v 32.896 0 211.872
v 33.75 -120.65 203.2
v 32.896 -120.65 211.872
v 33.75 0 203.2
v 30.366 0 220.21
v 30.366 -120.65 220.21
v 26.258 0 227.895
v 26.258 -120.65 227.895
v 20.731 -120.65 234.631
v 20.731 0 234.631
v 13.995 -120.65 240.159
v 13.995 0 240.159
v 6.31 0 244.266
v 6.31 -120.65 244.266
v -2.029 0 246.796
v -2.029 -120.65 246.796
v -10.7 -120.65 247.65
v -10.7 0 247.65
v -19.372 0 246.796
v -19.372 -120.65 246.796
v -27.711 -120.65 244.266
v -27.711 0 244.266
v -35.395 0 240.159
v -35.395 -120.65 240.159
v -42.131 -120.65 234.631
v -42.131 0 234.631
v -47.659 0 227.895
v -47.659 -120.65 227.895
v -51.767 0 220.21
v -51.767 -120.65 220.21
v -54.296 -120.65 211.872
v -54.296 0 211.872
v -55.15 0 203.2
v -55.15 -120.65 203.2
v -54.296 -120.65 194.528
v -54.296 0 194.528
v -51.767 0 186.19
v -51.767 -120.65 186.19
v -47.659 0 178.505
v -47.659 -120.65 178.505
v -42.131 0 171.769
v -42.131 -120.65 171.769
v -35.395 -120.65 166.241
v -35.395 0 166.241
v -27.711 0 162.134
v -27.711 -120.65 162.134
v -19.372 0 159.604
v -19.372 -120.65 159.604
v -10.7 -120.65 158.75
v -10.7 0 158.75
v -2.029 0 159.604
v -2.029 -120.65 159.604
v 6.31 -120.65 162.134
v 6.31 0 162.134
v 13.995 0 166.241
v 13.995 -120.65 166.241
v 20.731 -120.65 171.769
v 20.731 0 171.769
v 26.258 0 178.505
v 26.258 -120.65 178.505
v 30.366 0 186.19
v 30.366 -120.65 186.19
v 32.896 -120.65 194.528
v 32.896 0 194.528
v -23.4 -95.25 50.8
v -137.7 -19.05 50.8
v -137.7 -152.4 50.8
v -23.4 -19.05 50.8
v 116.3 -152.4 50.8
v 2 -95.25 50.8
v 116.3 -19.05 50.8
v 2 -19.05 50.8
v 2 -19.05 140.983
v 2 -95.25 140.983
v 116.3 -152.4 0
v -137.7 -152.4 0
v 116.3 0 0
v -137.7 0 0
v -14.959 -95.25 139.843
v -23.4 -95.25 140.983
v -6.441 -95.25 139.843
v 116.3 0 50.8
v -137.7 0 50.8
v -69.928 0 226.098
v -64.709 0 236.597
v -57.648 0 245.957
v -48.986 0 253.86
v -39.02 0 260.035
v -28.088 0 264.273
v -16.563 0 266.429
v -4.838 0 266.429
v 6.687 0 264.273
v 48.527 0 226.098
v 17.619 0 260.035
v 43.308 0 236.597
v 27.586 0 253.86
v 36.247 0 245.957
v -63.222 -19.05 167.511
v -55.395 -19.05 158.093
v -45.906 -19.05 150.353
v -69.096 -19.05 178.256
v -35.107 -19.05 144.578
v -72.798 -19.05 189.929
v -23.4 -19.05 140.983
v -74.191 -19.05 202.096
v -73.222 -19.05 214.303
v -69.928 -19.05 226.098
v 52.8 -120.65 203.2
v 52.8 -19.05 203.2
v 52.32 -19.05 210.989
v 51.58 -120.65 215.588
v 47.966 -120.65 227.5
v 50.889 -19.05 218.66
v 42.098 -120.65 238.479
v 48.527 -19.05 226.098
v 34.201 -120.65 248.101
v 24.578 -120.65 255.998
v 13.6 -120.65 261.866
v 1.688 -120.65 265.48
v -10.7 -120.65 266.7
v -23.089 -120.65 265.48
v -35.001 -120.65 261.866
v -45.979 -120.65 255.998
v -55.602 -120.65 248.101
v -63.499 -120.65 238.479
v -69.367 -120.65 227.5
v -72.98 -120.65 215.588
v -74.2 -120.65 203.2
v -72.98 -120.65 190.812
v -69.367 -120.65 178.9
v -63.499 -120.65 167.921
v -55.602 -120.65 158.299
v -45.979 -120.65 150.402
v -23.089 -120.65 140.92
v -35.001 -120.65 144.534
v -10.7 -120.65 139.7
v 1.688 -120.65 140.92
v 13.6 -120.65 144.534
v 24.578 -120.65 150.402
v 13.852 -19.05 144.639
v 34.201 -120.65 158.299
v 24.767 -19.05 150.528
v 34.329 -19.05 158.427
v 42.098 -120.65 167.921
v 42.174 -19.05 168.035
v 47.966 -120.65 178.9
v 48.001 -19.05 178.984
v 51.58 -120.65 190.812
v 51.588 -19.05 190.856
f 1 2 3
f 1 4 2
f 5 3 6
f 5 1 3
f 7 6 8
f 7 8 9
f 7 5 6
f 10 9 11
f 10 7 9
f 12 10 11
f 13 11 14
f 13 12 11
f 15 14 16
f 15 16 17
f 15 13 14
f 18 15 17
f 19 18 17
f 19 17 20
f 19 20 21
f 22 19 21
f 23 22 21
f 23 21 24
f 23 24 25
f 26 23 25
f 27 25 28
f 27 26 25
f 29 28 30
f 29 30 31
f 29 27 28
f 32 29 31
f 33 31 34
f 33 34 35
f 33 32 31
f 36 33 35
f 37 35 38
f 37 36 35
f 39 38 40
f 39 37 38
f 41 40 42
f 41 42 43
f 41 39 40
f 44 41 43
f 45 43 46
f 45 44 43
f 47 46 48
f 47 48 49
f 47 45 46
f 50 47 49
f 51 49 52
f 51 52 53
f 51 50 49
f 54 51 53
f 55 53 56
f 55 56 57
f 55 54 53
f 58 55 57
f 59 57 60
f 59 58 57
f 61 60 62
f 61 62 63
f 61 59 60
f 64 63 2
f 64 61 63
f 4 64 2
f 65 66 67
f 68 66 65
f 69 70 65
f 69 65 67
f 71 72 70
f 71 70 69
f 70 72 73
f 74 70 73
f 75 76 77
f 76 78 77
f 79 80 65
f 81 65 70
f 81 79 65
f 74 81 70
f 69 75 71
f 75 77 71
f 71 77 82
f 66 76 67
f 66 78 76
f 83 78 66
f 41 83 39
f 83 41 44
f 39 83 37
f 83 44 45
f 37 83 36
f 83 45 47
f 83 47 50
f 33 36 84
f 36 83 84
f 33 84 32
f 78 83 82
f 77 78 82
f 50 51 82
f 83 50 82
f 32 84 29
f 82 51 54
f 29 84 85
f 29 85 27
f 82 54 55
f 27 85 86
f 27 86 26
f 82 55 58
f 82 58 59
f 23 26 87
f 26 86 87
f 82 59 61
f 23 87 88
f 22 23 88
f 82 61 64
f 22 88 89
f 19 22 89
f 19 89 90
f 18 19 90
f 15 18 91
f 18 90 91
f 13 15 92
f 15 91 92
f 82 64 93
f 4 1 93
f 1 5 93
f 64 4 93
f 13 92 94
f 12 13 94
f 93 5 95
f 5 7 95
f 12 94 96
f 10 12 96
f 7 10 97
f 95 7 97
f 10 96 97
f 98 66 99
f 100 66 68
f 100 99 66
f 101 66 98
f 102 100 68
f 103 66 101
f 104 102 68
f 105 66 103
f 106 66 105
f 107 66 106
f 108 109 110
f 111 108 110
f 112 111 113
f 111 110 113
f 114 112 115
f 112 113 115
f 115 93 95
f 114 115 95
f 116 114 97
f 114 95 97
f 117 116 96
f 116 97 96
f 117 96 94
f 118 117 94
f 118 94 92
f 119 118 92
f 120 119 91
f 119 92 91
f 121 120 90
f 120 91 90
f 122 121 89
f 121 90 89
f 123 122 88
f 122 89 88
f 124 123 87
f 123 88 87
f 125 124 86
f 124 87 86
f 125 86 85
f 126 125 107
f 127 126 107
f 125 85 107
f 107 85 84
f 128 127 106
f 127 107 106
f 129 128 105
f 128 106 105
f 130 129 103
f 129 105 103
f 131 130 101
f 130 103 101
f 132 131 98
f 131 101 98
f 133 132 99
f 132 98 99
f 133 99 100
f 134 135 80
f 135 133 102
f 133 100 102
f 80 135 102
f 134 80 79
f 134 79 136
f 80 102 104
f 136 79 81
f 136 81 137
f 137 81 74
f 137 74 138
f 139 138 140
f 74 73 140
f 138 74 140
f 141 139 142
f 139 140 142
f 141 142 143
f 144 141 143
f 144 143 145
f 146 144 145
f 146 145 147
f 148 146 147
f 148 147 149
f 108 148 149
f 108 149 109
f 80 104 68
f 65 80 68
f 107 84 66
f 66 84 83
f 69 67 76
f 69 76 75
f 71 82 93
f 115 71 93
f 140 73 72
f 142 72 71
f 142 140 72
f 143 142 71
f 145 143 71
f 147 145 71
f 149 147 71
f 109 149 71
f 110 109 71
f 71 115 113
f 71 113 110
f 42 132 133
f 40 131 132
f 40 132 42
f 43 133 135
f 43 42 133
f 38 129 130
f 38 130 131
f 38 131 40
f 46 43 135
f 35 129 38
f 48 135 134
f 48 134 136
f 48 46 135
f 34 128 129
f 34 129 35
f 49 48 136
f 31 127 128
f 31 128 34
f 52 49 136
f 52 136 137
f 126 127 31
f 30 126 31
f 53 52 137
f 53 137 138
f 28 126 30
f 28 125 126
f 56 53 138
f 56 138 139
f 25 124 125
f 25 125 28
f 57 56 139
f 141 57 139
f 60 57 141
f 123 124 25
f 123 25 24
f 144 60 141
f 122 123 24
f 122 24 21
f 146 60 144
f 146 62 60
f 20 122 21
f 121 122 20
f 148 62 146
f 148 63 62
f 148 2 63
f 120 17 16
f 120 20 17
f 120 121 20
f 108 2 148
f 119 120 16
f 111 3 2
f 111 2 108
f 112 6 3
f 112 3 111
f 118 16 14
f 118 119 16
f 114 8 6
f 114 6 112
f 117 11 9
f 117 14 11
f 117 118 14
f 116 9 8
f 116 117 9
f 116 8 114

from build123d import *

# Parameters (mm, degrees)
F0_R     = 44.45
F1_DEPTH = 19.05
F2_W     = 254
F2_H     = 50.8
F3_DEPTH = 133.35
F4_R     = 63.5
F4_R_2   = 44.45
F5_DEPTH = 101.6
F7_DEPTH = 76.2


with BuildPart() as f1:
    # F0 (on Front) → F1 (new body)
    with BuildSketch(Plane.XZ):
        with BuildLine():
            Line((-137.7003500163, 50.8), (-137.7003500163, 0))
            Line((-137.7003500163, 0), (116.2996499837, 0))
            Line((116.2996499837, 0), (116.2996499837, 50.8))
            Line((116.2996499837, 50.8), (48.5273968003, 226.0981223472))
            ThreePointArc((48.5273968003, 226.0981223472), (-10.7003500163, 266.7), (-69.9280968329, 226.0981223472))
            Line((-69.9280968329, 226.0981223472), (-137.7003500163, 50.8))
        make_face()
        with Locations((-10.7003500163, 203.2)):
            Circle(F0_R, mode=Mode.SUBTRACT)
    extrude(amount=F1_DEPTH)

    # F2 (on face) → F3 (join)
    with BuildSketch(Plane.XZ.offset(19.05)):
        with Locations((-10.7003500163, 25.4)):
            Rectangle(F2_W, F2_H)
    extrude(amount=F3_DEPTH)

    # F4 (on face) → F5 (join)
    with BuildSketch(Plane.XZ.offset(19.05)):
        with Locations((-10.7003500163, 203.2)):
            Circle(F4_R)
        with Locations((-10.7003500163, 203.2)):
            Circle(F4_R_2, mode=Mode.SUBTRACT)
    extrude(amount=F5_DEPTH)

    # F6 (on face) → F7 (join)
    with BuildSketch(Plane.XZ.offset(19.05)):
        with BuildLine():
            Line((1.9996499837, 50.8), (1.9996499837, 140.9829605333))
            ThreePointArc((1.9996499837, 140.9829605333), (-10.7003500163, 139.7), (-23.4003500163, 140.9829605333))
            Line((-23.4003500163, 140.9829605333), (-23.4003500163, 50.8))
            Line((-23.4003500163, 50.8), (1.9996499837, 50.8))
        make_face()
    extrude(amount=F7_DEPTH)


solid = f1.part
